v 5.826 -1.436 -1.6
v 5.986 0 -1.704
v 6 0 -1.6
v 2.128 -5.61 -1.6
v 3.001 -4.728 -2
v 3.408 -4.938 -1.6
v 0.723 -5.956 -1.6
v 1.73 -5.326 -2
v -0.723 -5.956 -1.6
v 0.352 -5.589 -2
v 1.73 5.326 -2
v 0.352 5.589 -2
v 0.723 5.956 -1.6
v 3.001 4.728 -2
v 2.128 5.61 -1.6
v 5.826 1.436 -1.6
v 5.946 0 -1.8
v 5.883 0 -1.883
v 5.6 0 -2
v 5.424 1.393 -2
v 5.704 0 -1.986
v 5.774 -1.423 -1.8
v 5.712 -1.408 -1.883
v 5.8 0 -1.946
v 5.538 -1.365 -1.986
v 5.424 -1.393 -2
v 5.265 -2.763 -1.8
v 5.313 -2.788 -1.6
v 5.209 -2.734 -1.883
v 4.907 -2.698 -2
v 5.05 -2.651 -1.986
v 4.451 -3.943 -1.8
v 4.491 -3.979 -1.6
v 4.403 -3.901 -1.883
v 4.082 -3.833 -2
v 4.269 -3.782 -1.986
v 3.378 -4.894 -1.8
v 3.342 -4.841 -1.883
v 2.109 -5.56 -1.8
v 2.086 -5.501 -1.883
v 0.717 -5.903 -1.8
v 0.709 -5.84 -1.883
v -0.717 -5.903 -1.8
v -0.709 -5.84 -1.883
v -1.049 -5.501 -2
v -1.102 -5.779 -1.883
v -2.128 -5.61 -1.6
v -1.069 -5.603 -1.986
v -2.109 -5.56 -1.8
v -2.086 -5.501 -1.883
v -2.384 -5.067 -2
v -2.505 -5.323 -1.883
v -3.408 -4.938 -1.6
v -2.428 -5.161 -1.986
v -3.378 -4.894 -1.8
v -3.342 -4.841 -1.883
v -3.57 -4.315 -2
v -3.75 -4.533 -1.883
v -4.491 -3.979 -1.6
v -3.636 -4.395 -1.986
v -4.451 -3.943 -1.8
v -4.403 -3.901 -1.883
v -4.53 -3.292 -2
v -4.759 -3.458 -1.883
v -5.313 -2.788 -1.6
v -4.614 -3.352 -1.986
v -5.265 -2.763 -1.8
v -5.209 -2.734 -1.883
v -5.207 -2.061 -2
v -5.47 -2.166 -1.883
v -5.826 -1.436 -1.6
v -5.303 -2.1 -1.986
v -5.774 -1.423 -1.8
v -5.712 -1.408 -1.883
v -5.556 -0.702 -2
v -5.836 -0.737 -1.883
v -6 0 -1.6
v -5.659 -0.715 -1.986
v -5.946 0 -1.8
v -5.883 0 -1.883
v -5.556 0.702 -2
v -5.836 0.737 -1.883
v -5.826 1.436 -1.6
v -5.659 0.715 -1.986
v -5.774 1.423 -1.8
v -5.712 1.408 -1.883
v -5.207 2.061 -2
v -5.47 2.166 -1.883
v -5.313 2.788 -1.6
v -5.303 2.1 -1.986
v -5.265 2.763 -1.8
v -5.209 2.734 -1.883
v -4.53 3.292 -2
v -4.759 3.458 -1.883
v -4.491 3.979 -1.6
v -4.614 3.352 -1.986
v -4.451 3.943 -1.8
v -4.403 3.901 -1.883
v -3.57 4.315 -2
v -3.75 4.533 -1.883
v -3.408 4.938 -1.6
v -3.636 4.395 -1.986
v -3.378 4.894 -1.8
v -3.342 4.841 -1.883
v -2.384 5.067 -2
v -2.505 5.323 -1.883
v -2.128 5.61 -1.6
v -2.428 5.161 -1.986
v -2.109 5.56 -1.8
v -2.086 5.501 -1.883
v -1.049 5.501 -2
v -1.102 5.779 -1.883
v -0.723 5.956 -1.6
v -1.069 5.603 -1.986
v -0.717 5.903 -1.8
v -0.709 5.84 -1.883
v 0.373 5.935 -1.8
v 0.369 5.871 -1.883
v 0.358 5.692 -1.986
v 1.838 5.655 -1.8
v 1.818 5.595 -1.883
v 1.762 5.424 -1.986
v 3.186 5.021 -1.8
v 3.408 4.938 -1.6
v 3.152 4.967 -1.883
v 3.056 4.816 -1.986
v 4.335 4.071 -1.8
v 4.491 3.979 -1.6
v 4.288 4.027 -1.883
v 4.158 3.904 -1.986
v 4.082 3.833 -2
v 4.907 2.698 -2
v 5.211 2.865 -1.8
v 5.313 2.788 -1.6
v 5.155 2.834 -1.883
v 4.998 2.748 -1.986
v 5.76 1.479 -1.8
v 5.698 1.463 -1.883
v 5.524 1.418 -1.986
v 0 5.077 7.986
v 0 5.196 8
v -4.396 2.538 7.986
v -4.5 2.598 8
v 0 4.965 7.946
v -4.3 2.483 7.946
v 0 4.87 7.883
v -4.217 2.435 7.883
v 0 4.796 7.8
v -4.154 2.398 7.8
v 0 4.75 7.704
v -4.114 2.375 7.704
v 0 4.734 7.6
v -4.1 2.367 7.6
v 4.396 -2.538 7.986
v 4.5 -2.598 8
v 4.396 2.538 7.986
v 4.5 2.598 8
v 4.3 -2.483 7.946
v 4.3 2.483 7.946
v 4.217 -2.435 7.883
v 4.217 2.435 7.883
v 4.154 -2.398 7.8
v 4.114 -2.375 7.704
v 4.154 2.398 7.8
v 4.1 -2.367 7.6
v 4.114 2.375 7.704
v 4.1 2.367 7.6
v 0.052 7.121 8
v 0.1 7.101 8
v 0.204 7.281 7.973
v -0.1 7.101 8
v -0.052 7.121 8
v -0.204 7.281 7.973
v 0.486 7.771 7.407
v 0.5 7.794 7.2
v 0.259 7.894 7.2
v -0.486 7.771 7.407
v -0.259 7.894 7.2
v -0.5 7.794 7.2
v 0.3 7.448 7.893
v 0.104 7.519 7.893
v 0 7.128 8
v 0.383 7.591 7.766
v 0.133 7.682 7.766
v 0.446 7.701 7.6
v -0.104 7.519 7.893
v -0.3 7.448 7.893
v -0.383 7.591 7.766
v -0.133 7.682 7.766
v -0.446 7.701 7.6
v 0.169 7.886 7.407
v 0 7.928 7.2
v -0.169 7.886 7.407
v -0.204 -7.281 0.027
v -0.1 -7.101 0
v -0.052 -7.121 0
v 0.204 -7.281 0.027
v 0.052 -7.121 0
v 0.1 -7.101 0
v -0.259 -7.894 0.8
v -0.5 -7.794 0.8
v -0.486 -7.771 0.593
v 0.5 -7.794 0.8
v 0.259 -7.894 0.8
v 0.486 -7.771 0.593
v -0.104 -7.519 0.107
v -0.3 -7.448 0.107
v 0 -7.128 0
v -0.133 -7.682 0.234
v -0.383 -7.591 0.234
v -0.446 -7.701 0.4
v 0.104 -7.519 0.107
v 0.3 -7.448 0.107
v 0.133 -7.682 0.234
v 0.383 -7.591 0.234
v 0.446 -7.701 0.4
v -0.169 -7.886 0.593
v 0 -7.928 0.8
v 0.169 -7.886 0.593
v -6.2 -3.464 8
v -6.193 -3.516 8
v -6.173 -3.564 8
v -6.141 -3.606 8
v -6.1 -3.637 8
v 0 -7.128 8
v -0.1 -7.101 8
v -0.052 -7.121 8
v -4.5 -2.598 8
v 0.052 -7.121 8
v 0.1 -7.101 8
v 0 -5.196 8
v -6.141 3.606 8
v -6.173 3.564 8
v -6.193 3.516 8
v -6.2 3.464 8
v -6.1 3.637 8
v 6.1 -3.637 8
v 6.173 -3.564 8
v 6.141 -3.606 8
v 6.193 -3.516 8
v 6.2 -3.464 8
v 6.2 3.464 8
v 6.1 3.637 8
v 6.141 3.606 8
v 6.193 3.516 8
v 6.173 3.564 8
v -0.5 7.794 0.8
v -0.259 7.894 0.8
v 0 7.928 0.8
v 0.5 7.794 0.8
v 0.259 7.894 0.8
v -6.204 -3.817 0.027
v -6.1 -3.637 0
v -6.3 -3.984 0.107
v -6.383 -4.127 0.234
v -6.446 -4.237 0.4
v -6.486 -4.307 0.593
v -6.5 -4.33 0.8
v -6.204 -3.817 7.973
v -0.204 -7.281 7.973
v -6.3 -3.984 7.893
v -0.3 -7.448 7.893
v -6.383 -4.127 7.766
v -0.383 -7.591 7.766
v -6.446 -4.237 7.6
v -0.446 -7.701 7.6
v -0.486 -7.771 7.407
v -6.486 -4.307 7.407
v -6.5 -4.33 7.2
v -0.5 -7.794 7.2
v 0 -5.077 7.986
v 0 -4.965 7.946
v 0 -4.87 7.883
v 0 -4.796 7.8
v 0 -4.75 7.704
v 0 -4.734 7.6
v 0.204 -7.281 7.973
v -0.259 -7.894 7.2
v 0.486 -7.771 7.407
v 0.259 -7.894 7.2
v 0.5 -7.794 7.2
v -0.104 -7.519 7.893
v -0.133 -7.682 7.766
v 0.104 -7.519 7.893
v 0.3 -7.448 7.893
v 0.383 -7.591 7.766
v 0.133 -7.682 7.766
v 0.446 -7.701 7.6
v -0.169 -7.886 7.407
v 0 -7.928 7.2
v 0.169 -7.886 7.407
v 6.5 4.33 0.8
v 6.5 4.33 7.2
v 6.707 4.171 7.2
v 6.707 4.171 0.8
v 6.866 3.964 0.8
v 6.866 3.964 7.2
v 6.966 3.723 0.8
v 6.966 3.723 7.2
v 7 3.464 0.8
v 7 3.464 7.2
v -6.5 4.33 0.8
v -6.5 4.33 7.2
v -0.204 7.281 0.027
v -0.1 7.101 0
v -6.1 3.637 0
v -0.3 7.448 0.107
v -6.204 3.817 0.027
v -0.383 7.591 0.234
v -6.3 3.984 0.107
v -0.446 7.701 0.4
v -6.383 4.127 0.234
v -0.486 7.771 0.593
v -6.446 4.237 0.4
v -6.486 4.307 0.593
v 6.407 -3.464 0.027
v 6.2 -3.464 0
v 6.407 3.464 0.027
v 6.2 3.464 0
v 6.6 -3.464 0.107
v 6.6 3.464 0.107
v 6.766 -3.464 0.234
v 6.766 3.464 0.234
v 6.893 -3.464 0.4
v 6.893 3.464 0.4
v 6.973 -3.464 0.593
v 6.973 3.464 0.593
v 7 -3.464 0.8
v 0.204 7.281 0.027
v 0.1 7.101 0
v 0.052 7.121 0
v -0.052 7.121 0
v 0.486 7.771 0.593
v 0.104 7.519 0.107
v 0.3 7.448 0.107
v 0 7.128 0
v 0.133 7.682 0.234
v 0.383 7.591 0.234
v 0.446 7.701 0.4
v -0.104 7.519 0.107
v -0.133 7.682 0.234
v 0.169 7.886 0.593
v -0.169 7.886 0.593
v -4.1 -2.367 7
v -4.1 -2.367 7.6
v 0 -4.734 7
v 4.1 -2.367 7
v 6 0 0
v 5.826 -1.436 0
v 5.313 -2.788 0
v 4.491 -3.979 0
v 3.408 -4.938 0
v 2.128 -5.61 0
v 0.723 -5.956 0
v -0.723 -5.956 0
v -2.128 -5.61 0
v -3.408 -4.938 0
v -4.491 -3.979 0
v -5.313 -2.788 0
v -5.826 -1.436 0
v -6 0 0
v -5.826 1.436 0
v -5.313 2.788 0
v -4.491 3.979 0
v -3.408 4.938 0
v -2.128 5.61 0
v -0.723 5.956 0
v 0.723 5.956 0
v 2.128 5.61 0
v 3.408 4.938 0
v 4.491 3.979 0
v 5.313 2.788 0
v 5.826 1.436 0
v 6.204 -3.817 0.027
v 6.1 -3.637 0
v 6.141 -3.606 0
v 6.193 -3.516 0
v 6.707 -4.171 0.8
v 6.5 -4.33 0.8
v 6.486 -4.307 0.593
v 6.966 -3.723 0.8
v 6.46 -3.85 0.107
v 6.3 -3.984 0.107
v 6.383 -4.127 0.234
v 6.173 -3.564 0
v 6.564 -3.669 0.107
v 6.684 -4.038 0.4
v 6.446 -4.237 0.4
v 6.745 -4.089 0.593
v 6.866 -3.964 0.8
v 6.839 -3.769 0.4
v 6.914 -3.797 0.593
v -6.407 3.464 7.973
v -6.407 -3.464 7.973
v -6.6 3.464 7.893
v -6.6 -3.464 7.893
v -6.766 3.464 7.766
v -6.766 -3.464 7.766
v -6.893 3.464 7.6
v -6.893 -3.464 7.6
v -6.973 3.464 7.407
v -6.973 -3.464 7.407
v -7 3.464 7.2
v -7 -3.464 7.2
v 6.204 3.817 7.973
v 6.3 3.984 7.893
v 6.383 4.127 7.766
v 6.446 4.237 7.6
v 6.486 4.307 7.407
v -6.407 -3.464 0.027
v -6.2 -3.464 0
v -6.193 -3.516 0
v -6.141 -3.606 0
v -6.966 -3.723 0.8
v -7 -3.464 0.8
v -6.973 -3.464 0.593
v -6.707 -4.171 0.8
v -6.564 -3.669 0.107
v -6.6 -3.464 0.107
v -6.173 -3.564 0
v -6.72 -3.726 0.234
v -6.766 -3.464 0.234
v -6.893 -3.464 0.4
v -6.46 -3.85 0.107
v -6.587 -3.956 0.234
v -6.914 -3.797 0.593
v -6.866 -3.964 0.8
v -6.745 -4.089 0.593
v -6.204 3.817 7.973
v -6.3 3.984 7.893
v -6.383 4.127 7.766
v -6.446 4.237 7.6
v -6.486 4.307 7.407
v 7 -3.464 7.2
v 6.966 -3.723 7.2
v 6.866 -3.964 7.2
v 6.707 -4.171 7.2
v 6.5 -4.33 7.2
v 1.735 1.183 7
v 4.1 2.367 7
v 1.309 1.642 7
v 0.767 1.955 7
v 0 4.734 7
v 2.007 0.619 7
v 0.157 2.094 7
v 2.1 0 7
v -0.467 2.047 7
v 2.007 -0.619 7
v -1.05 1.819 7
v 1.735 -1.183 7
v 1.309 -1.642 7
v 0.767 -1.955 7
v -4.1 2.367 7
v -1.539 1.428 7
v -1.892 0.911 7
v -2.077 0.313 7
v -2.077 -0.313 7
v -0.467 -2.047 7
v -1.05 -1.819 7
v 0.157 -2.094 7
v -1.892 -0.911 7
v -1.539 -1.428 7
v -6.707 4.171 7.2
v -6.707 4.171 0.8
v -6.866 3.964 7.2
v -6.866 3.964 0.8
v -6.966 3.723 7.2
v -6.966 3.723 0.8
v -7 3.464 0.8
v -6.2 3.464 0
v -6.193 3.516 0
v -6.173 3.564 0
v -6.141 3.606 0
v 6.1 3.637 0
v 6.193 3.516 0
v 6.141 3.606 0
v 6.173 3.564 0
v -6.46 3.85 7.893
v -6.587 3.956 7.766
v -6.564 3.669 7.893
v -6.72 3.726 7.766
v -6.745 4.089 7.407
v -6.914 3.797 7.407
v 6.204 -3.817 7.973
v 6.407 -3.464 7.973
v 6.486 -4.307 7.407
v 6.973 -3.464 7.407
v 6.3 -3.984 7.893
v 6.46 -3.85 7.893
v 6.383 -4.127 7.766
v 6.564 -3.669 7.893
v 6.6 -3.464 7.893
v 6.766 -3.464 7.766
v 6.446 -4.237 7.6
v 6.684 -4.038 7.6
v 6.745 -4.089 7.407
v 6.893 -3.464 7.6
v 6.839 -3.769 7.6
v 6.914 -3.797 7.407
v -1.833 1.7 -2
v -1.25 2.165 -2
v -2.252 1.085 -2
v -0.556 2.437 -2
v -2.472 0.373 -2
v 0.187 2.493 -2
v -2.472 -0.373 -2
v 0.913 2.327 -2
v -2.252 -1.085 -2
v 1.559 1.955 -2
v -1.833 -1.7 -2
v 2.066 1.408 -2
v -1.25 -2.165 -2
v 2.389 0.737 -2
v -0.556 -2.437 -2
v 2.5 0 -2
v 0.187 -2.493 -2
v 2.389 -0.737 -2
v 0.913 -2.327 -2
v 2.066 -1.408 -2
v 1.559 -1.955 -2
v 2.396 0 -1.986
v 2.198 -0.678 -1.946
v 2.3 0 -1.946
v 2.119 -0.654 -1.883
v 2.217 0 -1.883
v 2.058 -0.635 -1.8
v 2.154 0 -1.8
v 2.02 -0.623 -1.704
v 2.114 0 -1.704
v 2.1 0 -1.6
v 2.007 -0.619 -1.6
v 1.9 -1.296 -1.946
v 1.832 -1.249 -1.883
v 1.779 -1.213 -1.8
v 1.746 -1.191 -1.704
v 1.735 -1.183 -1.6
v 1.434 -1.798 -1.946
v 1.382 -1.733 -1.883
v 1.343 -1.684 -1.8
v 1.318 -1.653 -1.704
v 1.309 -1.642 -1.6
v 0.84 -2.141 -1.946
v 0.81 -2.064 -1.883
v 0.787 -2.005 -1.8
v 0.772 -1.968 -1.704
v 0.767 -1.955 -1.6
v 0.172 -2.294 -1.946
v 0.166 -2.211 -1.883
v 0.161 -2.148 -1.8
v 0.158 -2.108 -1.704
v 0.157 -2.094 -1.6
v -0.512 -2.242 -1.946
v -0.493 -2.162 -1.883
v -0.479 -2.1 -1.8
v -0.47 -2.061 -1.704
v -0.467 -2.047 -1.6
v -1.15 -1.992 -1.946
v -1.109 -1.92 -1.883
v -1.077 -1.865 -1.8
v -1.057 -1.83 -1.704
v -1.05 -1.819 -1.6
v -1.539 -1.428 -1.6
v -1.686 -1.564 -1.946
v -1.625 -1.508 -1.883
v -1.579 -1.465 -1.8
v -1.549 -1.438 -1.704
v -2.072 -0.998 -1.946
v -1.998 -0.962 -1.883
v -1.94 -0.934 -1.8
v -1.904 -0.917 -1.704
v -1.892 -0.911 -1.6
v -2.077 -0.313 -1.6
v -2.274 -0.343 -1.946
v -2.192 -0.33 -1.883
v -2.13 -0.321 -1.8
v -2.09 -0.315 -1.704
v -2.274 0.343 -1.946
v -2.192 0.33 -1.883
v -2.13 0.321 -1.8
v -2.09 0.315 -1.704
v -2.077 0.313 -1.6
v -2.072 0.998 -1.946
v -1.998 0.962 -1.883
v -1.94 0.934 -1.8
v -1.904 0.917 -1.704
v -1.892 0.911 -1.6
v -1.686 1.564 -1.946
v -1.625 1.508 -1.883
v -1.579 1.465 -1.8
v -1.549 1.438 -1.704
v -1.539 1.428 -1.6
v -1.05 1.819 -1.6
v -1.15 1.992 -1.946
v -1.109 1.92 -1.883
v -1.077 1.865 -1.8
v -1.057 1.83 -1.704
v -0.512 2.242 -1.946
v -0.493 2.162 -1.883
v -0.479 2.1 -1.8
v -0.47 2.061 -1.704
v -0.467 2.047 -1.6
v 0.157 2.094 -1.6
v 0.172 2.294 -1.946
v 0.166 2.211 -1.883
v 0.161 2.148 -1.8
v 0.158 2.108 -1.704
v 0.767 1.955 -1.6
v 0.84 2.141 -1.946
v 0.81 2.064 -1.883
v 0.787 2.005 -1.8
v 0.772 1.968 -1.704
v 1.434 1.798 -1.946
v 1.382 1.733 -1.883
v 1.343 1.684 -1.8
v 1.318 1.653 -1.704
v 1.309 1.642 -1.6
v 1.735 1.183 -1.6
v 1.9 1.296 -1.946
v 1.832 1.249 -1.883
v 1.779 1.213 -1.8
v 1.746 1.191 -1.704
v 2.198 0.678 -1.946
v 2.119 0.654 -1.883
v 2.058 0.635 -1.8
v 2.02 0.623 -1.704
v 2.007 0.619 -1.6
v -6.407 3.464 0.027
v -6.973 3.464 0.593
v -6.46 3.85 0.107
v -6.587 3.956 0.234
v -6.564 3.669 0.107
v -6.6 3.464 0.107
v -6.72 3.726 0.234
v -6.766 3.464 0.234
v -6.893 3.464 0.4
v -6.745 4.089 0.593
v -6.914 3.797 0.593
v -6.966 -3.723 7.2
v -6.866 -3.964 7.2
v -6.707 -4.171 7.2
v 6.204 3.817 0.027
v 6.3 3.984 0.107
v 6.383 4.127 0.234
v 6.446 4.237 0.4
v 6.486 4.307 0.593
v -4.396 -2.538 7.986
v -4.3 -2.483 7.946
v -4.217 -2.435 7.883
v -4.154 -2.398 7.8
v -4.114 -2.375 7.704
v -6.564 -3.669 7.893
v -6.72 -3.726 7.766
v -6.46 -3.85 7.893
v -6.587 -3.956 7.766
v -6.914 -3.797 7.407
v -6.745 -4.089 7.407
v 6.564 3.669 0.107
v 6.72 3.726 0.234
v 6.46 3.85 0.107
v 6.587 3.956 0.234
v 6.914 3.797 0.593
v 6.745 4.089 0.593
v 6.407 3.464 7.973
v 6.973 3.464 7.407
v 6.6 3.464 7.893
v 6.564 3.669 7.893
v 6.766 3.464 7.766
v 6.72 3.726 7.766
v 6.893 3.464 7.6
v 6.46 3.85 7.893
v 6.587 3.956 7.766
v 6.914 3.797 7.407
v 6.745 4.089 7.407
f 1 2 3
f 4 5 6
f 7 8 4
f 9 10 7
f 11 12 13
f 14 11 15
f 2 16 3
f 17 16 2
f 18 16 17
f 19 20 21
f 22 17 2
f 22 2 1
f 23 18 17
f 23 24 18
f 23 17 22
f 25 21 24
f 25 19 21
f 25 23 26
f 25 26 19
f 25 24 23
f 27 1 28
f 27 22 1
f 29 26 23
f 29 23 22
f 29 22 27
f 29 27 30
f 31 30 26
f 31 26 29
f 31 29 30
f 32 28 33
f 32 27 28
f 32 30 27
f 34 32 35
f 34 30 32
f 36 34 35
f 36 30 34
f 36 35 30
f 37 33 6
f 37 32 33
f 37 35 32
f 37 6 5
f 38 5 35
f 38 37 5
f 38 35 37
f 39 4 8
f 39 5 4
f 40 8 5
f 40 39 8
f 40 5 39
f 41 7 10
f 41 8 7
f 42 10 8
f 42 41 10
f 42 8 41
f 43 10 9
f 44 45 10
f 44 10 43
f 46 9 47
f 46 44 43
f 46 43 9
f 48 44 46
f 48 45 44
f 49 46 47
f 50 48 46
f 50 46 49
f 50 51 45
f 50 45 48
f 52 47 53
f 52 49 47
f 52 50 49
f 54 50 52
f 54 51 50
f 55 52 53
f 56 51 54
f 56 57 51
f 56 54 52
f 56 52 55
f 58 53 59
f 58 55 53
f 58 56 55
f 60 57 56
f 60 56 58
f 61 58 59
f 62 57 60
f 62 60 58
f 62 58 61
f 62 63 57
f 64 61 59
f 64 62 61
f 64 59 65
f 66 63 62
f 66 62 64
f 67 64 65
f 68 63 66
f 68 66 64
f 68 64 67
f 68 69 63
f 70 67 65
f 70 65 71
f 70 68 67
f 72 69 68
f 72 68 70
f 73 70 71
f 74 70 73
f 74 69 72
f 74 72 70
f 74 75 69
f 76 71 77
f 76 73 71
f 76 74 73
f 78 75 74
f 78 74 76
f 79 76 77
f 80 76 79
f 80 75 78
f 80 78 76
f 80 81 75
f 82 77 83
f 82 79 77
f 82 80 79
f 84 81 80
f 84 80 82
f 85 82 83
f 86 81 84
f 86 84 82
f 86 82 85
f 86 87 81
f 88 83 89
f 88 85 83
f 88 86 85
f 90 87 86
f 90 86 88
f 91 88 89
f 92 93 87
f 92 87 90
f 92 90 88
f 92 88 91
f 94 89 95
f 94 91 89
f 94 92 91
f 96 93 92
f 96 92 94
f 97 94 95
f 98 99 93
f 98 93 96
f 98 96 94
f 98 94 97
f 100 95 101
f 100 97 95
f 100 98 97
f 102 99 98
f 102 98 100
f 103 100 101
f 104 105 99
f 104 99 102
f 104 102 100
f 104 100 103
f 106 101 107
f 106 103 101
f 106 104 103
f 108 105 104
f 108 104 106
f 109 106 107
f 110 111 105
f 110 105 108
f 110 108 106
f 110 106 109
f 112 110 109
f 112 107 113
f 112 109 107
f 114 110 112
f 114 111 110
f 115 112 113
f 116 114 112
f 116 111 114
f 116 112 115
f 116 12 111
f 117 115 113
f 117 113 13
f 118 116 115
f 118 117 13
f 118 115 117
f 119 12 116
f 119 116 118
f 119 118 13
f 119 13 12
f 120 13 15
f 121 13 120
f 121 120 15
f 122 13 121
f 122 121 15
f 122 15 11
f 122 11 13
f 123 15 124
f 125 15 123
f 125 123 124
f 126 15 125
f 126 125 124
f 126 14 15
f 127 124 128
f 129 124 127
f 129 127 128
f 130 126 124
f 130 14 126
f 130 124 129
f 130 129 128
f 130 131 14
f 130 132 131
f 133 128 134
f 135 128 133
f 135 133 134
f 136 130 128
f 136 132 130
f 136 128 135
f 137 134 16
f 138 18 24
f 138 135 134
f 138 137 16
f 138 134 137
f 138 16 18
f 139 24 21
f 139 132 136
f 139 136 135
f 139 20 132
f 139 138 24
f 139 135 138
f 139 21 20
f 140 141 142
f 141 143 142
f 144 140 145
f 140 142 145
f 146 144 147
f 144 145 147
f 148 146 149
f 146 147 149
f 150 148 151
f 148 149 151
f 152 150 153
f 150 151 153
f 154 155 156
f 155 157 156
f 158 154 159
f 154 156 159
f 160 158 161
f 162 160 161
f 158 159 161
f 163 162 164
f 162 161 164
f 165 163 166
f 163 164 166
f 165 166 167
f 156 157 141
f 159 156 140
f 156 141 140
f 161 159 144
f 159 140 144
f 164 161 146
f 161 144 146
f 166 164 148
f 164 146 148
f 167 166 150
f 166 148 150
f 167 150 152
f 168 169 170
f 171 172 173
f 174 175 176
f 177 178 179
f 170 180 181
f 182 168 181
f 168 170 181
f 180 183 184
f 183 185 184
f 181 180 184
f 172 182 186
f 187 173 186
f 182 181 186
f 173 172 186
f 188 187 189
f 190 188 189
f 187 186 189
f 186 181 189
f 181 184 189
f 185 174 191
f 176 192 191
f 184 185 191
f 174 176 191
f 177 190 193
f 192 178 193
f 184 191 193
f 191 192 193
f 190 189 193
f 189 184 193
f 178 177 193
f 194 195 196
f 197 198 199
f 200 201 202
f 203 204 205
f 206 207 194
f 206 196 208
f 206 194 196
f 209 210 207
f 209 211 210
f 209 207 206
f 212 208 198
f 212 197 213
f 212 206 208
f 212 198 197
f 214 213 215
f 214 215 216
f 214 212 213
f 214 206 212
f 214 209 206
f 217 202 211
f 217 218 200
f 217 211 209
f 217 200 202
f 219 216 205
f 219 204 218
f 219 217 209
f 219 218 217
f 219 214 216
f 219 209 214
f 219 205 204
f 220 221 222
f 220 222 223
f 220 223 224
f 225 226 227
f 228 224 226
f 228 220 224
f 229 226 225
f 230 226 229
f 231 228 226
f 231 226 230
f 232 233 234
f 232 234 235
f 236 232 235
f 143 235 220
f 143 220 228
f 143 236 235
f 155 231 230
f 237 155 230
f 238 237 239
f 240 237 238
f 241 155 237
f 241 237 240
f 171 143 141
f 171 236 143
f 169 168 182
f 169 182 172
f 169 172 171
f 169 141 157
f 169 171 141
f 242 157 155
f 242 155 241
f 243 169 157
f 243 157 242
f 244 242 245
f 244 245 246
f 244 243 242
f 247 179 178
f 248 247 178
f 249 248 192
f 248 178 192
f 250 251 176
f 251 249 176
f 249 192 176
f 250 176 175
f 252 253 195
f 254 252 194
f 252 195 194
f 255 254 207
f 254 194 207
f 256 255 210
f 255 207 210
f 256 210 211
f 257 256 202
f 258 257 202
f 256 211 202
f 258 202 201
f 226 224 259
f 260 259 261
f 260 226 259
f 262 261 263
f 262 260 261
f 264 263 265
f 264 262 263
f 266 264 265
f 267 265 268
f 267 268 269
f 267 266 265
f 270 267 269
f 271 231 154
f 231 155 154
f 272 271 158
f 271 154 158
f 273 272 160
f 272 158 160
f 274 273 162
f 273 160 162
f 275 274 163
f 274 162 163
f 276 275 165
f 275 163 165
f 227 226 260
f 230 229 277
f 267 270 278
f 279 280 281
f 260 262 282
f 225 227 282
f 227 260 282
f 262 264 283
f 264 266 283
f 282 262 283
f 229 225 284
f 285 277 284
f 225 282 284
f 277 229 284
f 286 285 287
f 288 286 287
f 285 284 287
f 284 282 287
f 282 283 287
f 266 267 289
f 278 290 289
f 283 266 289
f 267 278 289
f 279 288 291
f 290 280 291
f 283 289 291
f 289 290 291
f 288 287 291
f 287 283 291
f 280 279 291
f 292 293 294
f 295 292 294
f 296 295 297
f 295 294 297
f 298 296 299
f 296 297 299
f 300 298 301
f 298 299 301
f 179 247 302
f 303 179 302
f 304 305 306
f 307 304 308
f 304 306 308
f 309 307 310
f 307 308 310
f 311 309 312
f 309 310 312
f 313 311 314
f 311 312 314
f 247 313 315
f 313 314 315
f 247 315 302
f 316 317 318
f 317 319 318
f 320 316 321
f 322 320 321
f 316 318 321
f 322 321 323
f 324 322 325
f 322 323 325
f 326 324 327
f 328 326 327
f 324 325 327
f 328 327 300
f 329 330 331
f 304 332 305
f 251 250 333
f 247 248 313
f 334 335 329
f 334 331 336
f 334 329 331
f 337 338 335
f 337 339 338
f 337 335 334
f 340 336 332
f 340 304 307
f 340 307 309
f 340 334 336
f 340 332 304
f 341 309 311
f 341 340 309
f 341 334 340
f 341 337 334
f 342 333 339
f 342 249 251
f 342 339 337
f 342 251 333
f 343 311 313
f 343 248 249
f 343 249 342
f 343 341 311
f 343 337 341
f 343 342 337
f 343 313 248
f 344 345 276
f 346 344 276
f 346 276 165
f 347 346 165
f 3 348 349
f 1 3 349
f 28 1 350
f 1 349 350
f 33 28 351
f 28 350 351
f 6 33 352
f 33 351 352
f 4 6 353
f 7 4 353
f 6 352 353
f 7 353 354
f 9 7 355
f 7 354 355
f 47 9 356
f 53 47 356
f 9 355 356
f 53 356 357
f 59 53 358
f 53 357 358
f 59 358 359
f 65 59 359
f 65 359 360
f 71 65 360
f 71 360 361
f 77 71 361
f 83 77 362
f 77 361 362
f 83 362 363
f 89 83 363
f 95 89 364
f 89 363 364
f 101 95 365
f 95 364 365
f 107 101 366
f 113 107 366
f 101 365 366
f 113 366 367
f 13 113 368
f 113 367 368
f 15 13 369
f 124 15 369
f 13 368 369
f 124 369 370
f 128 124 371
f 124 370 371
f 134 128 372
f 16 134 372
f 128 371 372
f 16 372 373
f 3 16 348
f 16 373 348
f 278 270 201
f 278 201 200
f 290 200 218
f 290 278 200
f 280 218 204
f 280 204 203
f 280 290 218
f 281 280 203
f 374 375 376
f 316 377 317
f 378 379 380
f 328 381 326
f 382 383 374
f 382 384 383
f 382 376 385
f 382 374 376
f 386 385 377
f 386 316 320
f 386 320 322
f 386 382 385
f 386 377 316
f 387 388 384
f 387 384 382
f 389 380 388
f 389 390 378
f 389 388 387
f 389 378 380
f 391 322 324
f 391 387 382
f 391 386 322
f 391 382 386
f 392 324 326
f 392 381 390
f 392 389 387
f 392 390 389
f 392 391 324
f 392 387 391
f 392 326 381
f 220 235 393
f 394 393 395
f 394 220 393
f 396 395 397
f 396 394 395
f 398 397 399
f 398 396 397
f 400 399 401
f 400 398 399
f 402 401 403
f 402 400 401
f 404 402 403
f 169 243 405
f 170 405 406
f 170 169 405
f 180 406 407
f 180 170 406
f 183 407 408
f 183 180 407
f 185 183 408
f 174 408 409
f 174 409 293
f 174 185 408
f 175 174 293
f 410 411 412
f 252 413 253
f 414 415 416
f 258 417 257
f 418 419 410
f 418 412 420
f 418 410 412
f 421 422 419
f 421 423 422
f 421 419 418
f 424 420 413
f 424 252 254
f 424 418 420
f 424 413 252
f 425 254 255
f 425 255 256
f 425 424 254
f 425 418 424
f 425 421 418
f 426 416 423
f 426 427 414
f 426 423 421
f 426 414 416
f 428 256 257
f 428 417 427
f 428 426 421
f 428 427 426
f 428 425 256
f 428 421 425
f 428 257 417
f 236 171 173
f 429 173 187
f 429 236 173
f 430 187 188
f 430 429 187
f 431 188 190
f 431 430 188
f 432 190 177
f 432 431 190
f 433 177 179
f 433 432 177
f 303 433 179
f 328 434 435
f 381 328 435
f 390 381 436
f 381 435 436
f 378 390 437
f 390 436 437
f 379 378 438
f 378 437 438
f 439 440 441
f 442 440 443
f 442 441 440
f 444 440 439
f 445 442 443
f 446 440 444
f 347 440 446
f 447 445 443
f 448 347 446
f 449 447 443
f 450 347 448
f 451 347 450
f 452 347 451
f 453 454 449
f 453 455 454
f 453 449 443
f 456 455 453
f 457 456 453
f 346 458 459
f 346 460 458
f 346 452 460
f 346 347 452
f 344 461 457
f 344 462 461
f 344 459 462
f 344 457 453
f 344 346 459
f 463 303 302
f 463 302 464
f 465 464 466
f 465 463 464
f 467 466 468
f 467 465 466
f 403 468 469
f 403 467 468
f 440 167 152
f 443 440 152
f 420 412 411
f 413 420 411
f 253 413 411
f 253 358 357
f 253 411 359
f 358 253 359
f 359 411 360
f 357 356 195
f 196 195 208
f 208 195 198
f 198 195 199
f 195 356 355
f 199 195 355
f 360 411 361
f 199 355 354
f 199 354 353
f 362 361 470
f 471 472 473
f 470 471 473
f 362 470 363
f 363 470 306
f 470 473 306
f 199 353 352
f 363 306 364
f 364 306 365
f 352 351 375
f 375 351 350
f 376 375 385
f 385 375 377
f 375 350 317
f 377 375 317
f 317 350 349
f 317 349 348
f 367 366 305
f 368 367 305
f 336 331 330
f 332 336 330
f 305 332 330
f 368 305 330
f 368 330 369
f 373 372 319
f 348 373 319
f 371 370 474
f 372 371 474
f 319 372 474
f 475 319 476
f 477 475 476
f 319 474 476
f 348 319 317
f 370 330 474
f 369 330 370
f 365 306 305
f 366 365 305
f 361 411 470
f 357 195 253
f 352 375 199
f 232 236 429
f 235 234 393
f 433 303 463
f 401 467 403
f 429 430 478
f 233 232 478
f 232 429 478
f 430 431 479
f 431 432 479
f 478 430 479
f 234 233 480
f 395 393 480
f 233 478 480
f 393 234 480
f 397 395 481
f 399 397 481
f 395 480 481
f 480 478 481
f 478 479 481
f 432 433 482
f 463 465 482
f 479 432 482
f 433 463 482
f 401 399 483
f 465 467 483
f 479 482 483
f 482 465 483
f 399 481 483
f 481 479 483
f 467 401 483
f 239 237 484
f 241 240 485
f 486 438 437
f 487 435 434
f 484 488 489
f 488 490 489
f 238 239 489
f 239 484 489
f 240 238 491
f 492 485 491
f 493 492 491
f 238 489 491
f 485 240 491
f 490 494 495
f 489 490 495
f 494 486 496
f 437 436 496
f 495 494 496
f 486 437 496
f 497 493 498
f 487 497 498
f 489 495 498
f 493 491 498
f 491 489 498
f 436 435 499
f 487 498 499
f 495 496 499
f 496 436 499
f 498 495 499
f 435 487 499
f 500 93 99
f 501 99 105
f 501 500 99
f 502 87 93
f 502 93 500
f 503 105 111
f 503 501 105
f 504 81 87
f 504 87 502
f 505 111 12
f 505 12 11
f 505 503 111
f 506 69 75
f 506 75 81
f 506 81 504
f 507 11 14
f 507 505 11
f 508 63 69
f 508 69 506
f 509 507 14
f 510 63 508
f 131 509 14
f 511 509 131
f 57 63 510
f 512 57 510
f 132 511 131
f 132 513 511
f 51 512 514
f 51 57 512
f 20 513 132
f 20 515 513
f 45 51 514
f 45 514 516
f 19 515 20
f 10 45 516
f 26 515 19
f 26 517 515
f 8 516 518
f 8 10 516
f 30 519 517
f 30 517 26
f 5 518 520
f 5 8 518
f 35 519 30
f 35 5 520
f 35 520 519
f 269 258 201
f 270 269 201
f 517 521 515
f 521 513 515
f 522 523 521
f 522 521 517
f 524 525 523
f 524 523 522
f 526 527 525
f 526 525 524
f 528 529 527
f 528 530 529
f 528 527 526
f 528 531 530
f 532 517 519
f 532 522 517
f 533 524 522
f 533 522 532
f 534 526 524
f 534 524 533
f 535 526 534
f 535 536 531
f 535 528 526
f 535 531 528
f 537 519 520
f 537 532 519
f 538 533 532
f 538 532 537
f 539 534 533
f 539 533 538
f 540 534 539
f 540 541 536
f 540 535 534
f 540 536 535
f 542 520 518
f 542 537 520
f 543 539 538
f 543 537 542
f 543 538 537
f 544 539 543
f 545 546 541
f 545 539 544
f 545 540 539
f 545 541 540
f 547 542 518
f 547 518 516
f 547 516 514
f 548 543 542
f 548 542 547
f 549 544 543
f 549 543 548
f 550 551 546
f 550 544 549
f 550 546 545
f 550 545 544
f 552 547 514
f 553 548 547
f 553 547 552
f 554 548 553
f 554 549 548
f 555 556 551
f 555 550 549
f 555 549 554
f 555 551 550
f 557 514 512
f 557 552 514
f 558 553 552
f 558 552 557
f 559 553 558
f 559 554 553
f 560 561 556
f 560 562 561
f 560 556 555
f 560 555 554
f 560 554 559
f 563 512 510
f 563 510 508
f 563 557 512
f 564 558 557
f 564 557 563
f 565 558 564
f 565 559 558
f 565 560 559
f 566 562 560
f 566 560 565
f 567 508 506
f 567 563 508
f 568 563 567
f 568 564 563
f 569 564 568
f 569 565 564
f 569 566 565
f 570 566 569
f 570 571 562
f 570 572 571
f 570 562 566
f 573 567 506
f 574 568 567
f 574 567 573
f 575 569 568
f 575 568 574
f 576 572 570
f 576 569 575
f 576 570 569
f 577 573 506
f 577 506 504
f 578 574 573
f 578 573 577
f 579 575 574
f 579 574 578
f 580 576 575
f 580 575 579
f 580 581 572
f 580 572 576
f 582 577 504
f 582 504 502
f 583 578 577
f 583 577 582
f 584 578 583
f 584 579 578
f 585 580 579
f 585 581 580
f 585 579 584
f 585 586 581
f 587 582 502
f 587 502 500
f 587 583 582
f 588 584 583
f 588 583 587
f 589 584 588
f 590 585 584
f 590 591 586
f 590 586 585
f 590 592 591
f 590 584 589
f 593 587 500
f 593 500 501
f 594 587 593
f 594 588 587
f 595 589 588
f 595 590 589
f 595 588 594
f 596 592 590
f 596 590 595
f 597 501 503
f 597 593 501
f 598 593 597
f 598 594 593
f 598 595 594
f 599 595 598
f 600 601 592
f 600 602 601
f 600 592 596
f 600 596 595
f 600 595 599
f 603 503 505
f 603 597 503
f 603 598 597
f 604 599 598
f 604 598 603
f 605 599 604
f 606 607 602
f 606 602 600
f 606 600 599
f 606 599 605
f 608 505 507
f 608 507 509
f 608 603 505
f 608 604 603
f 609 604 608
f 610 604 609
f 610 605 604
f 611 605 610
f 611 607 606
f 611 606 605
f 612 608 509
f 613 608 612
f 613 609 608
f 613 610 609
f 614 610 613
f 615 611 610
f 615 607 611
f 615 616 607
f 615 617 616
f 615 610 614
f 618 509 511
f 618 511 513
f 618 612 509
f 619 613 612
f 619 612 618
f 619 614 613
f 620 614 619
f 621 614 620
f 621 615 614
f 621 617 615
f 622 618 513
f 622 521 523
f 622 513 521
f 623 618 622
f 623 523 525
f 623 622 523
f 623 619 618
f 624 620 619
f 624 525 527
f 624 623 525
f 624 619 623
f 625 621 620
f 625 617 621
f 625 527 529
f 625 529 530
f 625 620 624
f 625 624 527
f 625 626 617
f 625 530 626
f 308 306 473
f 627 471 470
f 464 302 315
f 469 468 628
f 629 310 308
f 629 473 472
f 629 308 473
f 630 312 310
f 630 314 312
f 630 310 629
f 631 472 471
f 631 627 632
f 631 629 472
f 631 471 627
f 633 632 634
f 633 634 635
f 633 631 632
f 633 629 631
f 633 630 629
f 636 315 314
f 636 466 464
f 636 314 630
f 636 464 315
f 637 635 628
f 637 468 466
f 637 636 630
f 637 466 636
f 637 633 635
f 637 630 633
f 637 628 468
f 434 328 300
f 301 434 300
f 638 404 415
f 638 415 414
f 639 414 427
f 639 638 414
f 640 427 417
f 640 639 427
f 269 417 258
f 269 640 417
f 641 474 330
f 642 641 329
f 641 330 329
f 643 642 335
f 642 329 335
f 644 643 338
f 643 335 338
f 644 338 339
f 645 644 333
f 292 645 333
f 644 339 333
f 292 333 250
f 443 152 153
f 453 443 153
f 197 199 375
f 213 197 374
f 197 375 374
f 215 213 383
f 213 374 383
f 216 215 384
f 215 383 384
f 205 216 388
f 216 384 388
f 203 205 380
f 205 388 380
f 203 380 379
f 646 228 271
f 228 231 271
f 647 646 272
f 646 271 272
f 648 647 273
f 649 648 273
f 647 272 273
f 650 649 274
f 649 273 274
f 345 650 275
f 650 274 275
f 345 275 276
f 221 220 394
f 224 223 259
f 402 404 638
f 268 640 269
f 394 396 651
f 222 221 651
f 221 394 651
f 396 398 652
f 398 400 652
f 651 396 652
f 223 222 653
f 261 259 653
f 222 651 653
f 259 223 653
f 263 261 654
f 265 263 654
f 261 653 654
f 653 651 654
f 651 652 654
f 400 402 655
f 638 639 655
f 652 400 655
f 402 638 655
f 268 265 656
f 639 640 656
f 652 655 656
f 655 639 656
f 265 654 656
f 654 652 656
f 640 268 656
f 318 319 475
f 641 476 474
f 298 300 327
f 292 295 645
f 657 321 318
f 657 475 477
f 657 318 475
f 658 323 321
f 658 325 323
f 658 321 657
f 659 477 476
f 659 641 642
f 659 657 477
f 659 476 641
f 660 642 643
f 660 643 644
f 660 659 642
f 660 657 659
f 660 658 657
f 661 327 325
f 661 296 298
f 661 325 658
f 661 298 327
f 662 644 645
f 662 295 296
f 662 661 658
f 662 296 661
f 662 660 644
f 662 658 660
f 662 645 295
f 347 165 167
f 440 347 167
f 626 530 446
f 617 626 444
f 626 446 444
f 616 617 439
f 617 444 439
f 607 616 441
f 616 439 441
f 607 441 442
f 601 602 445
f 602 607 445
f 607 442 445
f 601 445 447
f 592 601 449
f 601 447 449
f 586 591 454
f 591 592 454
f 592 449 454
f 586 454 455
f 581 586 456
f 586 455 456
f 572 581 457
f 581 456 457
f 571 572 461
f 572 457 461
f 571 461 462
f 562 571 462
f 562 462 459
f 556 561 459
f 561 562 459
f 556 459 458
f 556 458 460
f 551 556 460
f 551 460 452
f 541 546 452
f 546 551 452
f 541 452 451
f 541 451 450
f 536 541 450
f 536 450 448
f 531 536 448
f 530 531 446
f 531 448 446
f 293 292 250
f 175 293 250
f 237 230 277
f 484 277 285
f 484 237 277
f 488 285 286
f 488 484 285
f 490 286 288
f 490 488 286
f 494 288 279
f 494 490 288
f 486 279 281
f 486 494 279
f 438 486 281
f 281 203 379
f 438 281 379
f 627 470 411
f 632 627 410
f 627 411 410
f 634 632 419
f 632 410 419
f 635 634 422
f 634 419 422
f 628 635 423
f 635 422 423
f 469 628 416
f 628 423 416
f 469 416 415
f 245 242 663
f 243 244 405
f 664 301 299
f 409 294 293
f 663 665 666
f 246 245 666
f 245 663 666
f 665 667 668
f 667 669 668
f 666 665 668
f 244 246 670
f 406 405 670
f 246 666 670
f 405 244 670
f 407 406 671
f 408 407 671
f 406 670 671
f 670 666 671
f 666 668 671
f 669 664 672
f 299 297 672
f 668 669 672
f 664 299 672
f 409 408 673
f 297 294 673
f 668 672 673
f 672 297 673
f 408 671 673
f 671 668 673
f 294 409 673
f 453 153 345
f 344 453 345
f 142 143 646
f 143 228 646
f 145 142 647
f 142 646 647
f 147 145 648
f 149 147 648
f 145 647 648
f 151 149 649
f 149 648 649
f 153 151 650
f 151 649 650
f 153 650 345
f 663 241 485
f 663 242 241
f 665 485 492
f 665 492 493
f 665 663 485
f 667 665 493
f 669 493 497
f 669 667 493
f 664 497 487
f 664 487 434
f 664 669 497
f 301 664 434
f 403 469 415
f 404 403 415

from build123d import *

# Parameters (mm, degrees)
BOSS_EXTRUDE1_DEPTH = 8
CUT_EXTRUDE1_DEPTH  = 1
SKETCH3_R           = 2.1
CUT_EXTRUDE2_DEPTH  = 5
FILLET1_R           = 1
FILLET2_R           = 0.8
FILLET3_R           = 0.4
SKETCH4_R           = 6
SKETCH4_R_2         = 2.1
BOSS_EXTRUDE2_DEPTH = 2
FILLET4_R           = 0.4
SKETCH5_R           = 2.1
BOSS_EXTRUDE3_DEPTH = 0.4
SKETCH6_R           = 2.1
CUT_EXTRUDE3_DEPTH  = 14.88727504


with BuildPart() as part:
    # Sketch1 → Boss-Extrude1 (new body)
    with BuildSketch(Plane.XY):
        Polygon((0, 8.082903769), (-7, 4.041451884), (-7, -4.041451884), (0, -8.082903769), (7, -4.041451884), (7, 4.041451884), align=None)
    extrude(amount=BOSS_EXTRUDE1_DEPTH)

    # Sketch2 → Cut-Extrude1 (cut)
    with BuildSketch(Plane.XY.offset(8)):
        Polygon((0, 4.734272207), (-4.1, 2.367136104), (-4.1, -2.367136104), (0, -4.734272207), (4.1, -2.367136104), (4.1, 2.367136104), align=None)
    extrude(amount=-CUT_EXTRUDE1_DEPTH, mode=Mode.SUBTRACT)

    # Sketch3 → Cut-Extrude2 (cut)
    with BuildSketch(Plane.XY.offset(7)):
        Circle(SKETCH3_R)
    extrude(amount=-CUT_EXTRUDE2_DEPTH, mode=Mode.SUBTRACT)

    # Fillet1
    fillet1_edges = [part.edges().sort_by_distance(p)[0] for p in [
        (7, 4.041451884, 4),
        (7, -4.041451884, 4),
        (0, -8.082903769, 4),
        (-7, -4.041451884, 4),
        (-7, 4.041451884, 4),
        (0, 8.082903769, 4),
    ]]
    fillet(fillet1_edges, radius=FILLET1_R)

    # Fillet2
    fillet2_edges = [part.edges().sort_by_distance(p)[0] for p in [
        (7, 0, 0),
        (7, 0, 8),
        (3.5, 6.062177826, 0),
        (3.5, -6.062177826, 0),
        (-3.5, -6.062177826, 0),
        (-7, 0, 0),
        (-3.5, 6.062177826, 0),
        (6.866025404, 3.964101615, 0),
        (0, 7.92820323, 0),
        (-6.866025404, 3.964101615, 0),
        (-6.866025404, -3.964101615, 0),
        (0, -7.92820323, 0),
        (6.866025404, -3.964101615, 0),
        (3.5, -6.062177826, 8),
        (3.5, 6.062177826, 8),
        (-3.5, 6.062177826, 8),
        (-7, 0, 8),
        (-3.5, -6.062177826, 8),
        (6.866025404, 3.964101615, 8),
        (0, 7.92820323, 8),
        (-6.866025404, 3.964101615, 8),
        (-6.866025404, -3.964101615, 8),
        (0, -7.92820323, 8),
        (6.866025404, -3.964101615, 8),
    ]]
    fillet(fillet2_edges, radius=FILLET2_R)

    # Fillet3
    fillet3_edges = [part.edges().sort_by_distance(p)[0] for p in [
        (2.05, 3.550704156, 8),
        (-2.05, 3.550704156, 8),
        (-4.1, 0, 8),
        (-2.05, -3.550704156, 8),
        (2.05, -3.550704156, 8),
        (4.1, 0, 8),
    ]]
    fillet(fillet3_edges, radius=FILLET3_R)

    # Sketch4 → Boss-Extrude2 (add)
    with BuildSketch(Plane(origin=(0, 0, 0), x_dir=(-1, 0, 0), z_dir=(0, 0, -1))):
        with Locations(Location((0, 0, 0), (0, 0, 180))):
            Circle(SKETCH4_R)
        with Locations(Location((0, 0, 0), (0, 0, 180))):
            Circle(SKETCH4_R_2, mode=Mode.SUBTRACT)
    extrude(amount=BOSS_EXTRUDE2_DEPTH)

    # Fillet4
    fillet4_edges = [part.edges().sort_by_distance(p)[0] for p in [
        (-6, 0, -2),
        (-2.1, 0, -2),
    ]]
    fillet(fillet4_edges, radius=FILLET4_R)

    # Sketch5 → Boss-Extrude3 (add)
    with BuildSketch(Plane.XY.offset(7)):
        with Locations(Location((0, 0, 0), (0, 0, 180))):
            Circle(SKETCH5_R)
    extrude(amount=-BOSS_EXTRUDE3_DEPTH)

    # Sketch6 → Cut-Extrude3 (cut, through all)
    with BuildSketch(Plane.XY.offset(7)):
        Circle(SKETCH6_R)
    extrude(amount=-CUT_EXTRUDE3_DEPTH, mode=Mode.SUBTRACT)


solid = part.part
